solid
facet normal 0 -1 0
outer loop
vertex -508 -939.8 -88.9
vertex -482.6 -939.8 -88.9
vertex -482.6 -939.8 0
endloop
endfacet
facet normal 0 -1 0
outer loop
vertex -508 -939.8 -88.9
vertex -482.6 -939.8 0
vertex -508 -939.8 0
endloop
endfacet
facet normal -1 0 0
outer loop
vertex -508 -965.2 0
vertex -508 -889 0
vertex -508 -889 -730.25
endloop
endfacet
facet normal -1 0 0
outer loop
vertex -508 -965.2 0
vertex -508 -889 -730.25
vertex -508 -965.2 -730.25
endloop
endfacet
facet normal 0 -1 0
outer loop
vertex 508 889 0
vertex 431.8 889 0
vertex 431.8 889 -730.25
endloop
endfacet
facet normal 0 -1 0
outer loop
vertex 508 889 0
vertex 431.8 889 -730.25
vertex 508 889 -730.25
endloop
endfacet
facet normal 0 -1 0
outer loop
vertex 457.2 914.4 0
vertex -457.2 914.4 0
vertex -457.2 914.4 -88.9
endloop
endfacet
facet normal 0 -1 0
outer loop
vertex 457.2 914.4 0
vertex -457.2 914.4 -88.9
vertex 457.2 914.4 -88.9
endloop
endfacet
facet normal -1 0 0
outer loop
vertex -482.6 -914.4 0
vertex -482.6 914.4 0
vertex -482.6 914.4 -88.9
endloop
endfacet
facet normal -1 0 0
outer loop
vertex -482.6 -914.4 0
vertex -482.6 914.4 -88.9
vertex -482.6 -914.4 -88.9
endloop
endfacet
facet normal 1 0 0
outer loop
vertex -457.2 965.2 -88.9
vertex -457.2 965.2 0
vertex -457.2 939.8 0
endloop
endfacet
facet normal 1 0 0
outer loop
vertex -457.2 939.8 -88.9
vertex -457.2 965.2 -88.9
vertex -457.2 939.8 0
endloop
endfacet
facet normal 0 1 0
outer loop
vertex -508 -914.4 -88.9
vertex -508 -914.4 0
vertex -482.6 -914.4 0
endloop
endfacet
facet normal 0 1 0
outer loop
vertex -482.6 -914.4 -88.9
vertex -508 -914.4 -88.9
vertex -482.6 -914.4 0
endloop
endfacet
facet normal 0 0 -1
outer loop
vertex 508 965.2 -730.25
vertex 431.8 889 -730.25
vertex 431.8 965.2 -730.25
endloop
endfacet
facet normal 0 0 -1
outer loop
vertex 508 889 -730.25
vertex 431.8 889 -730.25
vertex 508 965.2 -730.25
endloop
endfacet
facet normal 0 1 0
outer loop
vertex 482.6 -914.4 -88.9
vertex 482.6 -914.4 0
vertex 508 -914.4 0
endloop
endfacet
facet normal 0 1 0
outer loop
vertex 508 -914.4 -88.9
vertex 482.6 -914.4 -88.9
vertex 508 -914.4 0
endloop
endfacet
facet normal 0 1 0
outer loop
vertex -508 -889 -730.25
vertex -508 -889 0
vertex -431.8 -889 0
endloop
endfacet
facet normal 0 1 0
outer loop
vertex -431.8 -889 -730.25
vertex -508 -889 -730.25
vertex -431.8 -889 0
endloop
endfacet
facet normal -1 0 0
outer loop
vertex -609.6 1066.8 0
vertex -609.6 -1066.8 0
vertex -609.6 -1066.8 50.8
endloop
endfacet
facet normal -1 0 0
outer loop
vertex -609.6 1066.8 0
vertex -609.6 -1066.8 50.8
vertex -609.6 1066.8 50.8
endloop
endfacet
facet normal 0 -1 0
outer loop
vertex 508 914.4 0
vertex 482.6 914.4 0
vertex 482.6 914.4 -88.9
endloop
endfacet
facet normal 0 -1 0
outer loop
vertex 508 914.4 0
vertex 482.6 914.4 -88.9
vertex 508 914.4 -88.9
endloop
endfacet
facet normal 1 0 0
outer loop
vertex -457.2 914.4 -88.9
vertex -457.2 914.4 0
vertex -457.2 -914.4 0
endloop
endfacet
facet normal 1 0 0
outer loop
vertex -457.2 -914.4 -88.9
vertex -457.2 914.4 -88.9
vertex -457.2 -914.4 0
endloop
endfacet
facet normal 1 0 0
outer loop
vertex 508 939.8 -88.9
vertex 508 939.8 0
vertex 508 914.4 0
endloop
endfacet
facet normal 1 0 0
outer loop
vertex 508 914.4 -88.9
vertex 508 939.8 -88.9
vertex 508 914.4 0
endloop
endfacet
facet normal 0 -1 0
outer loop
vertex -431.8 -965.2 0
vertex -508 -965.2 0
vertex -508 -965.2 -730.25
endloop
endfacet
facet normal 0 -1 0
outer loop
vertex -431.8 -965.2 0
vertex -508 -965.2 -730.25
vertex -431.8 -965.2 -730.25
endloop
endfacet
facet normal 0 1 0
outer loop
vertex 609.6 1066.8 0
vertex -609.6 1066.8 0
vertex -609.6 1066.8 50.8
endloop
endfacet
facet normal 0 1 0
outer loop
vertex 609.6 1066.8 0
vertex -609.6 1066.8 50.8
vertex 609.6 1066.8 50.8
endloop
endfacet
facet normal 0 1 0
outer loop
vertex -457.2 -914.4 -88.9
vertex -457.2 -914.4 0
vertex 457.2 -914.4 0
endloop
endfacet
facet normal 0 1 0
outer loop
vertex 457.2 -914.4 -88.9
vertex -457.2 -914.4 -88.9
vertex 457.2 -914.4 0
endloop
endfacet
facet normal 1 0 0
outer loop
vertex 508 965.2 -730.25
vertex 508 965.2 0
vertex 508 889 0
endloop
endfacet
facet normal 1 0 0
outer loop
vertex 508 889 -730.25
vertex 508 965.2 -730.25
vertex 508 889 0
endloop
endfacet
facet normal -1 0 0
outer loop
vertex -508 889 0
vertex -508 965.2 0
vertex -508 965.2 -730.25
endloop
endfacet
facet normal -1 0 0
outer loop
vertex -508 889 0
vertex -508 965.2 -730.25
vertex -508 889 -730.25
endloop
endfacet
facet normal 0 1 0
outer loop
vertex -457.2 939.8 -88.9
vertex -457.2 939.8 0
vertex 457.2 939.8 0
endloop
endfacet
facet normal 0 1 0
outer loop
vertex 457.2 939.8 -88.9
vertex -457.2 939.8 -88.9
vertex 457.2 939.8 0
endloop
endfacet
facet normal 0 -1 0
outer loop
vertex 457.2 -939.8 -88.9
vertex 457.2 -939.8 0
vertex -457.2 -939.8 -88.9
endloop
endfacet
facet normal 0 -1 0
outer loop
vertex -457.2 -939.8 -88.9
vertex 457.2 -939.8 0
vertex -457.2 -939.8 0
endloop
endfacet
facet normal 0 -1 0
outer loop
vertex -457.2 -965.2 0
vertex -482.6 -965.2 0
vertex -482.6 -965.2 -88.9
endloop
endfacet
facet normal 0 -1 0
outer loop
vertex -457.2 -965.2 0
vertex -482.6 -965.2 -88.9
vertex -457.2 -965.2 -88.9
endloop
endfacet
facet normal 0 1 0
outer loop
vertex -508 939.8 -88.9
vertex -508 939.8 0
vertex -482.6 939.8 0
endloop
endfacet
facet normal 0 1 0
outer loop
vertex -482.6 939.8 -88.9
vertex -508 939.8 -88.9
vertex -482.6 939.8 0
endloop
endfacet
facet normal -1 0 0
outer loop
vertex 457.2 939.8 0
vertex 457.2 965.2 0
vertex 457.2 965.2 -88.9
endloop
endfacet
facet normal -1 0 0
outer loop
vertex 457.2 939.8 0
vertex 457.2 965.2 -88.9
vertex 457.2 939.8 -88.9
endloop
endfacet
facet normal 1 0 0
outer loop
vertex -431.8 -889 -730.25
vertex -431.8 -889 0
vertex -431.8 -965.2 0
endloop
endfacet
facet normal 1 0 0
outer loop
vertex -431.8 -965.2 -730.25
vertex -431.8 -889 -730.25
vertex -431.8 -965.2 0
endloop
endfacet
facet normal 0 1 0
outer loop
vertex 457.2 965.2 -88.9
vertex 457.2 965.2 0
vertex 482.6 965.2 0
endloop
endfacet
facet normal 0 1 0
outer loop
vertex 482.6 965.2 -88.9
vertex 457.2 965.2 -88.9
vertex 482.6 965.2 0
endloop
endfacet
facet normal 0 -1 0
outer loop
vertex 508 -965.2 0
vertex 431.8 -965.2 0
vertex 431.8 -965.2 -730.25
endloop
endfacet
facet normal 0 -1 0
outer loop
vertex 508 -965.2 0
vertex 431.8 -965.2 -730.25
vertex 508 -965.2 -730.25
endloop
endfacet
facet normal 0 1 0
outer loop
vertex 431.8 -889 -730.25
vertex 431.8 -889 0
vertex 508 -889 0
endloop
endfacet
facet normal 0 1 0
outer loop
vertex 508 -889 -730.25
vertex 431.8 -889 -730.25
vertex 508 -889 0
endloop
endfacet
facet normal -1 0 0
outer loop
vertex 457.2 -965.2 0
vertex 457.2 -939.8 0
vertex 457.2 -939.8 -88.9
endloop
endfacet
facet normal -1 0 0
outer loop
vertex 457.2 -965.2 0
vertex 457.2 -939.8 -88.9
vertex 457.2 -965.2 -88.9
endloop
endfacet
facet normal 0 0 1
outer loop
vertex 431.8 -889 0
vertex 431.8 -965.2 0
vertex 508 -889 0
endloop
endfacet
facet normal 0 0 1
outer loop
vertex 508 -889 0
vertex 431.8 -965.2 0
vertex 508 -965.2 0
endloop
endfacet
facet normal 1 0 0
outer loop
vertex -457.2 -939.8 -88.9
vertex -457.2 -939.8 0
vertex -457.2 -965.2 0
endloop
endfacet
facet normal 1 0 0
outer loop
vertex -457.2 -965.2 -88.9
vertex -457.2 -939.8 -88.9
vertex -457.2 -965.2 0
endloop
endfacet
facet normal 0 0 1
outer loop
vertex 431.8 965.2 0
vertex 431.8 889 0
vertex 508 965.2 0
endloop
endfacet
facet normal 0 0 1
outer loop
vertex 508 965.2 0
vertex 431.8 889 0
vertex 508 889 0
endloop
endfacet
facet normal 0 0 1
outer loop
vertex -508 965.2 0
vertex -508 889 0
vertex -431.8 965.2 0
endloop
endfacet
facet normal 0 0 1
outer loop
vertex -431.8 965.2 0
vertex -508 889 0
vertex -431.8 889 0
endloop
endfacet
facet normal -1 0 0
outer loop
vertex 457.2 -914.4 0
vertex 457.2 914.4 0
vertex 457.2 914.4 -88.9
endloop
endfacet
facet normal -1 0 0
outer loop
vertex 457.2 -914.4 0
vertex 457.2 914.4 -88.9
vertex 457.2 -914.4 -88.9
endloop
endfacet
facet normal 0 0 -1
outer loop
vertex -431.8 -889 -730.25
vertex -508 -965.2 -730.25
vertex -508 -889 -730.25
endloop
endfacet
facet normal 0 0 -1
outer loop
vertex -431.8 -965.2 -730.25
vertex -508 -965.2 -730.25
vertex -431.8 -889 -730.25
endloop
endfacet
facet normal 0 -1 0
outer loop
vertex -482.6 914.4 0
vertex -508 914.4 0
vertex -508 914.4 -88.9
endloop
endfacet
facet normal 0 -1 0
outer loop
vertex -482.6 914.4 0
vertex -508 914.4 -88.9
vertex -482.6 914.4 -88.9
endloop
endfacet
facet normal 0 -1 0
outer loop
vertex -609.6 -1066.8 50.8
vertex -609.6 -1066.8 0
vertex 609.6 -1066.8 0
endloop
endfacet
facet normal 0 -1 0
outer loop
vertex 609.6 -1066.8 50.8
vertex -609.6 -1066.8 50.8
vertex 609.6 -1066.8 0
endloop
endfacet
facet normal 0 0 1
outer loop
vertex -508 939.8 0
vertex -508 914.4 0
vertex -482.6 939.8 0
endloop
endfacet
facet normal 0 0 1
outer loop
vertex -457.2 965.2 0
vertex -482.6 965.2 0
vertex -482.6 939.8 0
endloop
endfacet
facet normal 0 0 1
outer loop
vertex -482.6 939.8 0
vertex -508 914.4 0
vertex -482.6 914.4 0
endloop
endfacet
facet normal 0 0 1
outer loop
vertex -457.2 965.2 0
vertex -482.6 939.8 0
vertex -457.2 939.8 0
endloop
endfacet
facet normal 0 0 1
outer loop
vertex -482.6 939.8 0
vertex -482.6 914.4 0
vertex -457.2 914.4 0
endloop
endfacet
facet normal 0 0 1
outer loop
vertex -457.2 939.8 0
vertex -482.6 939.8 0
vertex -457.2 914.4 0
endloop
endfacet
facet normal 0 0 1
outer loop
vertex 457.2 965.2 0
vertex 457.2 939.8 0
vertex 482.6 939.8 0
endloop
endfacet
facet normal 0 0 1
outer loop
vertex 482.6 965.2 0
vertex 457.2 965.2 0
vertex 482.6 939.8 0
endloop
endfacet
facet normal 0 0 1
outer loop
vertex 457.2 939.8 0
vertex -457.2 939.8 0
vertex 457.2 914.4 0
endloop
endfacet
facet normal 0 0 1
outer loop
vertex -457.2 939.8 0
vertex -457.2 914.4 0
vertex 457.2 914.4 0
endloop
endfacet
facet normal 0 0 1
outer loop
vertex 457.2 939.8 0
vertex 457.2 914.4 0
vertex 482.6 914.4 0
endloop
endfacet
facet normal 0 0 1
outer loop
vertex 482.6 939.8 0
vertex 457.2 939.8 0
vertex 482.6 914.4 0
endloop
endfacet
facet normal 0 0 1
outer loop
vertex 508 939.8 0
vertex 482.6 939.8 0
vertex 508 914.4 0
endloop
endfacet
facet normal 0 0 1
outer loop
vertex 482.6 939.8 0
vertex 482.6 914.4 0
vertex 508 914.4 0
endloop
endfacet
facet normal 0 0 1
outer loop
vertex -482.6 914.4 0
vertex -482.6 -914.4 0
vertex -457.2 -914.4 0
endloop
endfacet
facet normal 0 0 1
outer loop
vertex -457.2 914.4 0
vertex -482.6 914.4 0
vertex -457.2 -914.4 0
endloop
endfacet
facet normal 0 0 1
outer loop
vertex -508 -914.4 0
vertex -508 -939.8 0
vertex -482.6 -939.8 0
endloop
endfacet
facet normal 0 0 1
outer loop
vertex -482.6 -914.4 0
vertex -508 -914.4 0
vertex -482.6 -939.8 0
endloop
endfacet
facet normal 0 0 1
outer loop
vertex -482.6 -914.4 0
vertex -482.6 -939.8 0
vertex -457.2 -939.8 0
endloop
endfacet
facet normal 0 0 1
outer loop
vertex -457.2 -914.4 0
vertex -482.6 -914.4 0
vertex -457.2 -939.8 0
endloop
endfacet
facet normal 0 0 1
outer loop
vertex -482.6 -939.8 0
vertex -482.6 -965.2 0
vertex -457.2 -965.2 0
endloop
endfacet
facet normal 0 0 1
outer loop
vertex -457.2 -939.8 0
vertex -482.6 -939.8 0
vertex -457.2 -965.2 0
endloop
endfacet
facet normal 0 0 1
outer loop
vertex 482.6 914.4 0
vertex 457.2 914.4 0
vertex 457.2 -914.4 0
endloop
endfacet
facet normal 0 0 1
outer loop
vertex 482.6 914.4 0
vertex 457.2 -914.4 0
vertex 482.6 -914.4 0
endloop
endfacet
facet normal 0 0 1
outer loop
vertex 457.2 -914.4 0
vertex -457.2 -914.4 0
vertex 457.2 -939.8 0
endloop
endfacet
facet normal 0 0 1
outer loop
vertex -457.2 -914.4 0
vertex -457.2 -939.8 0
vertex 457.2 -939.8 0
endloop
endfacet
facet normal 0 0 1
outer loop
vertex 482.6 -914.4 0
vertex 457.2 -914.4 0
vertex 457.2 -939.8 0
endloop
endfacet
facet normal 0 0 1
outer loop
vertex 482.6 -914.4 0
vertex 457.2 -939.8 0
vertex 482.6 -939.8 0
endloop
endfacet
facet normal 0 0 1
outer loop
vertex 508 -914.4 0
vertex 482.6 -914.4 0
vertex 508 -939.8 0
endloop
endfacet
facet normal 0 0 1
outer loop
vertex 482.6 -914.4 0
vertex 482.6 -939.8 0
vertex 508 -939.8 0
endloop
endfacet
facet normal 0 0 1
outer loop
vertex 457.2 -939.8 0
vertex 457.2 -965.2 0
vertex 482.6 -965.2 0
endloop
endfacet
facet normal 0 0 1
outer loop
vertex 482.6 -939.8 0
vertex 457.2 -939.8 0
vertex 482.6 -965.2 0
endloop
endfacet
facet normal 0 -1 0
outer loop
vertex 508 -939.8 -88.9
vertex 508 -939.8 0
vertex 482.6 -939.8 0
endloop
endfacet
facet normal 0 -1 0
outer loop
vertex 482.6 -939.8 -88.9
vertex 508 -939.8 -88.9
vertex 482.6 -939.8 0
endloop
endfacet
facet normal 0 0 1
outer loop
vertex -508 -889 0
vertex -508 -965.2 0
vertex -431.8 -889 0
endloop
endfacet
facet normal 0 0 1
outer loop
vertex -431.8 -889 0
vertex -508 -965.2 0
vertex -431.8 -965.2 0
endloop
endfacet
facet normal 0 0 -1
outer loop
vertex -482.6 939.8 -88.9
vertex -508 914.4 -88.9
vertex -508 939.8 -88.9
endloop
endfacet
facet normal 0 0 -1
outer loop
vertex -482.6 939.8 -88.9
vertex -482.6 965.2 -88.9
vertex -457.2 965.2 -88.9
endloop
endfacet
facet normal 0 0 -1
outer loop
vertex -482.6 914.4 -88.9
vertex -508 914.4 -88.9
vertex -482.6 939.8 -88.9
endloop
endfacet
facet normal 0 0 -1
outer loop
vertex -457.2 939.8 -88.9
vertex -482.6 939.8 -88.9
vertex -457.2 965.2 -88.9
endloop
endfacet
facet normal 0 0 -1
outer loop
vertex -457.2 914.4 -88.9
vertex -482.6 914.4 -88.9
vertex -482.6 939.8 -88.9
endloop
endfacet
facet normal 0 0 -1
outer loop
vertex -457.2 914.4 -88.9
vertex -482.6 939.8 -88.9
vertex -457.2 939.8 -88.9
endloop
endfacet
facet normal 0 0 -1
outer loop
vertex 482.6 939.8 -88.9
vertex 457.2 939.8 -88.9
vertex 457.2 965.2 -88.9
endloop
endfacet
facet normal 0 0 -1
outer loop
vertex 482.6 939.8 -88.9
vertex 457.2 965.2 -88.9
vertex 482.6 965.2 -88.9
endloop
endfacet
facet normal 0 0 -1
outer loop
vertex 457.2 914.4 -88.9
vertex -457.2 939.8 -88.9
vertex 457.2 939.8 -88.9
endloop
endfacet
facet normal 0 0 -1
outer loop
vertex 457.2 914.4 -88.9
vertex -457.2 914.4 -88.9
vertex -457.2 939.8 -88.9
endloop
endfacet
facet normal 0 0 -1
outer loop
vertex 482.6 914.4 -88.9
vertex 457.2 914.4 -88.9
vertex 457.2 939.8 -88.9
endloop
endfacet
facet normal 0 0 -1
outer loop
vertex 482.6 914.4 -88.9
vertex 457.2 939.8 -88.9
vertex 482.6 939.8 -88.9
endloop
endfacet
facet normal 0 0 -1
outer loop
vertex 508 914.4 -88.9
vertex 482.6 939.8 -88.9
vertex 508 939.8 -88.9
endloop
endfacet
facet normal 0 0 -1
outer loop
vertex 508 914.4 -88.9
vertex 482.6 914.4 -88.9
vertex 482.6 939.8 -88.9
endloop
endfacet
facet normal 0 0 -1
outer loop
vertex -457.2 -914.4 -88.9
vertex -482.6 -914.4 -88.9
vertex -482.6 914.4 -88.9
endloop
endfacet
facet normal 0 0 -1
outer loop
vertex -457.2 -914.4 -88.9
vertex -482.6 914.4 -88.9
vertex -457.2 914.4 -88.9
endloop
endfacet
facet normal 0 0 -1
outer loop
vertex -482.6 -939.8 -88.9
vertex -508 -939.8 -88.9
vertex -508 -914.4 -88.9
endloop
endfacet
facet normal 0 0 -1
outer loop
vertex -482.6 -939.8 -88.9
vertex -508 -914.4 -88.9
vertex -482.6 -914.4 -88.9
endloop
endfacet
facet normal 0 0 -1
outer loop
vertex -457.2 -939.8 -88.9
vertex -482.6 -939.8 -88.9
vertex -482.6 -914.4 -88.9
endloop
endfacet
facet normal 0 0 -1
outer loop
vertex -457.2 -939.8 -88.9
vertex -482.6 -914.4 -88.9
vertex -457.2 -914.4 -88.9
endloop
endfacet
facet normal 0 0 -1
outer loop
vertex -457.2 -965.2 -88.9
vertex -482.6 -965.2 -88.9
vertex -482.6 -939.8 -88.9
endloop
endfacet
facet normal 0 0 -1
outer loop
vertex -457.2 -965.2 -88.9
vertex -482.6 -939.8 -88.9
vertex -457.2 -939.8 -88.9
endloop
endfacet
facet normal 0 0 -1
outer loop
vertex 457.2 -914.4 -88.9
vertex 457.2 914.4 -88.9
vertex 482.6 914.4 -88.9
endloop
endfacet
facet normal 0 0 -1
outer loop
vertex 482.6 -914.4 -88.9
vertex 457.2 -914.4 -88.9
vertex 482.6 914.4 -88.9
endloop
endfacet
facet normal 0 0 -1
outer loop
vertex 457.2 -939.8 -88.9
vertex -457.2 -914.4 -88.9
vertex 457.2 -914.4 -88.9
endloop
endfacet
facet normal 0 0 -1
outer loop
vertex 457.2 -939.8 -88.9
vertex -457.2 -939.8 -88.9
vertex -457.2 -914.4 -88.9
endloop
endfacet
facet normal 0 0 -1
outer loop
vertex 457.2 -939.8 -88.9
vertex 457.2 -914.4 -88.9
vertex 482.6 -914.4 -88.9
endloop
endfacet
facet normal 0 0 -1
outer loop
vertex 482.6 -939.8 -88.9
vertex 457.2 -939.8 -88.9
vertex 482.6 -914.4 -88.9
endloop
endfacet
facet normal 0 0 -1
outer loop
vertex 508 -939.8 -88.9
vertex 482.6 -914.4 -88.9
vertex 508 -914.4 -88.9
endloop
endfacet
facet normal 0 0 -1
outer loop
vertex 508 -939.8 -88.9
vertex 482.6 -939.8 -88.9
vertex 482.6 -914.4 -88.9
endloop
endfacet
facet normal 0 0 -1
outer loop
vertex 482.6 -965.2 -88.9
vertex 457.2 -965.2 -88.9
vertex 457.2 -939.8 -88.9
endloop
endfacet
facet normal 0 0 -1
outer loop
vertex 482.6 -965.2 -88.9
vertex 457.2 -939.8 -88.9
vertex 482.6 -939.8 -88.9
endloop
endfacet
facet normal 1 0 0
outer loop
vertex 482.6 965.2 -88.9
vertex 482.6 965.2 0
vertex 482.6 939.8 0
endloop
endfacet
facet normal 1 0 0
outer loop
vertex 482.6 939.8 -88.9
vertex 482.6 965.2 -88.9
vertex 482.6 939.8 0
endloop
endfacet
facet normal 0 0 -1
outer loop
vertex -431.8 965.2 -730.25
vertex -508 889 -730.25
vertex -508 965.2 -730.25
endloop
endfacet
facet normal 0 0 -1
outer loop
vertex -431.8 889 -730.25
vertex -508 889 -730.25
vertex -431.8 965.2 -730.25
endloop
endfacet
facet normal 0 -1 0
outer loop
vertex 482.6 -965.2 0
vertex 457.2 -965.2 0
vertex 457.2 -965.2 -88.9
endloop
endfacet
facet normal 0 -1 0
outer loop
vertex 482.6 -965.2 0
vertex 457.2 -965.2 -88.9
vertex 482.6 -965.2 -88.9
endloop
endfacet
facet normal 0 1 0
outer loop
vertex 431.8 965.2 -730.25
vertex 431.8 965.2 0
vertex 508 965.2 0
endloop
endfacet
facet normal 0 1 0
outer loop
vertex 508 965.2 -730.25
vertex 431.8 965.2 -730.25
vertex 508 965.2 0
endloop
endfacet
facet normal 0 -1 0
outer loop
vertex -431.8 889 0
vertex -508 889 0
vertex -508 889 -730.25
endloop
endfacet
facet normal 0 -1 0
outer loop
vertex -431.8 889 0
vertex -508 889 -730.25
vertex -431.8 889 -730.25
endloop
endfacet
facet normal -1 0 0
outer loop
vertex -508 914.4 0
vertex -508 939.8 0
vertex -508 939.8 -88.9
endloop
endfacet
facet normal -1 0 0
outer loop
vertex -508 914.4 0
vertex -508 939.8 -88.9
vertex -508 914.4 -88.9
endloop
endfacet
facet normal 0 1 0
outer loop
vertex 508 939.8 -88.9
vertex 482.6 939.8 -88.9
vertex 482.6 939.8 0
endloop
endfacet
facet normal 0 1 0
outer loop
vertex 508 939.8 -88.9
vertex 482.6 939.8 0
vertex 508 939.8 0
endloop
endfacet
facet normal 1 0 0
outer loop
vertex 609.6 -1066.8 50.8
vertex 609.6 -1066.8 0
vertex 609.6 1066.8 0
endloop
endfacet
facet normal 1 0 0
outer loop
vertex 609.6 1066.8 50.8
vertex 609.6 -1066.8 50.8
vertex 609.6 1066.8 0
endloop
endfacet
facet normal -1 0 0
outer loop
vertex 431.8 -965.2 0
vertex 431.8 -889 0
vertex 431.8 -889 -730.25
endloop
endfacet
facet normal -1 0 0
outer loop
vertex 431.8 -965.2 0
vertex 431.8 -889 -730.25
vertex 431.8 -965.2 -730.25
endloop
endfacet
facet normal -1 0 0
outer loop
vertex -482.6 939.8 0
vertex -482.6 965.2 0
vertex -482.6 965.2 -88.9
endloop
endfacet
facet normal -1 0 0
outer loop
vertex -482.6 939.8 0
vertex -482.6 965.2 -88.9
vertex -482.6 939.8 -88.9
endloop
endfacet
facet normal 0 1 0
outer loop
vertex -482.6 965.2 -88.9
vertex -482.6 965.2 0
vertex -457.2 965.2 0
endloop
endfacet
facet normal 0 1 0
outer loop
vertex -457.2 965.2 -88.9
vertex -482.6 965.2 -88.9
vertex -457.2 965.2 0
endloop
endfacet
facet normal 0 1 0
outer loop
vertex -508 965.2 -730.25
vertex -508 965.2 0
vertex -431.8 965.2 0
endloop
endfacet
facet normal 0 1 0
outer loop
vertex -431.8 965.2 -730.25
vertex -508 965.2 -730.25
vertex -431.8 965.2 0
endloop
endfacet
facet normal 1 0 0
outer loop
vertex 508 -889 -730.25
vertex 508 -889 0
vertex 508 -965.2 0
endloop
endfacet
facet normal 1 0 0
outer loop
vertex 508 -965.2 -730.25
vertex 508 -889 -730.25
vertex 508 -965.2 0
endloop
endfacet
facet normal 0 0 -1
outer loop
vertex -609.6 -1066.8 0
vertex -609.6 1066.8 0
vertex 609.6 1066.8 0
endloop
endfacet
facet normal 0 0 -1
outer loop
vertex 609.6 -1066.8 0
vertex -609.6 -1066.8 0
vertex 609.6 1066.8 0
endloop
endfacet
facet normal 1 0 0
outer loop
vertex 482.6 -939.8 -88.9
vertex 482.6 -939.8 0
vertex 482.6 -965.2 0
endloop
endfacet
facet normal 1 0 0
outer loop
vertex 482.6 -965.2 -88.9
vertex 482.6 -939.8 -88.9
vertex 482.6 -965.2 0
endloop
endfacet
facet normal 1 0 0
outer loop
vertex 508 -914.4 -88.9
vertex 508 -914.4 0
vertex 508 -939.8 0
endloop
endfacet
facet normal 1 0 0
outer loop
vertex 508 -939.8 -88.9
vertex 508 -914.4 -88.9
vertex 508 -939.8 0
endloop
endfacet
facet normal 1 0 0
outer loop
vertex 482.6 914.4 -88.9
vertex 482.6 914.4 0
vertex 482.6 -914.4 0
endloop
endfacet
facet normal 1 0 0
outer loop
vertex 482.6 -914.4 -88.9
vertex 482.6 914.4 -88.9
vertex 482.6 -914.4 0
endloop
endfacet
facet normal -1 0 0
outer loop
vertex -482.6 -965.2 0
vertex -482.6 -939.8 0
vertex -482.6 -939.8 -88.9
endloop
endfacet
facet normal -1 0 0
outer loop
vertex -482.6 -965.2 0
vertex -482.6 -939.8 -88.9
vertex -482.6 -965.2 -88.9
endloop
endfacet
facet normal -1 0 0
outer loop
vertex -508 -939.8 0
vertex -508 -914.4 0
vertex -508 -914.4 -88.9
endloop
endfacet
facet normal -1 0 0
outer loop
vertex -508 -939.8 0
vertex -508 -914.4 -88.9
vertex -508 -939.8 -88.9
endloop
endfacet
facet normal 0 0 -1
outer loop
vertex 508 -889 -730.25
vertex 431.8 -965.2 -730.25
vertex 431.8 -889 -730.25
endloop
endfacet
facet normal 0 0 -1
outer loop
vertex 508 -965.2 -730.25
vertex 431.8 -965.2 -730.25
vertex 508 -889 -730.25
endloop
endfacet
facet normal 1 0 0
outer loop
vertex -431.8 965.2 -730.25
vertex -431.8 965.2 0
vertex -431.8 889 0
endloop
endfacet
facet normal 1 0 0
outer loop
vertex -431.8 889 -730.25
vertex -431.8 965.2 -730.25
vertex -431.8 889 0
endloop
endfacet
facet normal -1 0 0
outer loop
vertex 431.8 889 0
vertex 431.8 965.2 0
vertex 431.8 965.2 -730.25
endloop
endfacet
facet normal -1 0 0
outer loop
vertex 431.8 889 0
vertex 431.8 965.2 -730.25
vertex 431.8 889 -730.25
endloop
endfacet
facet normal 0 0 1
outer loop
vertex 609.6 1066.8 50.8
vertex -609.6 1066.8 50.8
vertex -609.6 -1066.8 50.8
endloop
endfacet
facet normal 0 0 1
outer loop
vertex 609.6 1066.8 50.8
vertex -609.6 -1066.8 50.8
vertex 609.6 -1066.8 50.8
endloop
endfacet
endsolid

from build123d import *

# Parameters (mm, degrees)
F0_W     = 1219.2
F0_H     = 2133.6
F1_DEPTH = 50.8
F2_W     = 76.2
F2_H     = 76.2
F3_DEPTH = 730.25
F4_W     = 25.4
F4_H     = 25.4
F4_H_2   = 1828.8
F4_W_2   = 914.4
F5_DEPTH = 88.9


with BuildPart() as f1:
    # F0 (on Top) → F1 (new body)
    with BuildSketch(Plane.XY):
        Rectangle(F0_W, F0_H)
    extrude(amount=F1_DEPTH)


with BuildPart() as f3:
    # F2 (on face) → F3 (new body)
    with BuildSketch(Plane(origin=(0, 0, 0), x_dir=(1, 0, 0), z_dir=(0, 0, -1))):
        with Locations((-469.9, -927.1)):
            Rectangle(F2_W, F2_H)
    extrude(amount=F3_DEPTH)


with BuildPart() as f3b:
    # F2 (on face) → F3, piece 2 (new body)
    with BuildSketch(Plane(origin=(0, 0, 0), x_dir=(1, 0, 0), z_dir=(0, 0, -1))):
        with Locations((469.9, -927.1)):
            Rectangle(F2_W, F2_H)
    extrude(amount=F3_DEPTH)


with BuildPart() as f3c:
    # F2 (on face) → F3, piece 3 (new body)
    with BuildSketch(Plane(origin=(0, 0, 0), x_dir=(1, 0, 0), z_dir=(0, 0, -1))):
        with Locations((-469.9, 927.1)):
            Rectangle(F2_W, F2_H)
    extrude(amount=F3_DEPTH)


with BuildPart() as f3d:
    # F2 (on face) → F3, piece 4 (new body)
    with BuildSketch(Plane(origin=(0, 0, 0), x_dir=(1, 0, 0), z_dir=(0, 0, -1))):
        with Locations((469.9, 927.1)):
            Rectangle(F2_W, F2_H)
    extrude(amount=F3_DEPTH)


with BuildPart() as f5:
    # F4 (on face) → F5 (new body)
    with BuildSketch(Plane(origin=(0, 0, 0), x_dir=(1, 0, 0), z_dir=(0, 0, -1))):
        with Locations((-495.3, -927.1)):
            Rectangle(F4_W, F4_H)
        with Locations((-469.9, 0)):
            Rectangle(F4_W, F4_H_2)
        with Locations((-469.9, -927.1)):
            Rectangle(F4_W, F4_H)
        with Locations((0, -927.1)):
            Rectangle(F4_W_2, F4_H)
        with Locations((-495.3, 927.1)):
            Rectangle(F4_W, F4_H)
        with Locations((-469.9, 927.1)):
            Rectangle(F4_W, F4_H)
        with Locations((-469.9, -952.5)):
            Rectangle(F4_W, F4_H)
        with Locations((469.9, 0)):
            Rectangle(F4_W, F4_H_2)
        with Locations((469.9, -927.1)):
            Rectangle(F4_W, F4_H)
        with Locations((0, 927.1)):
            Rectangle(F4_W_2, F4_H)
        with Locations((-469.9, 952.5)):
            Rectangle(F4_W, F4_H)
        with Locations((495.3, -927.1)):
            Rectangle(F4_W, F4_H)
        with Locations((469.9, 927.1)):
            Rectangle(F4_W, F4_H)
        with Locations((469.9, -952.5)):
            Rectangle(F4_W, F4_H)
        with Locations((495.3, 927.1)):
            Rectangle(F4_W, F4_H)
        with Locations((469.9, 952.5)):
            Rectangle(F4_W, F4_H)
    extrude(amount=F5_DEPTH)


solid = Compound([f1.part, f3.part, f3b.part, f3c.part, f3d.part, f5.part])
